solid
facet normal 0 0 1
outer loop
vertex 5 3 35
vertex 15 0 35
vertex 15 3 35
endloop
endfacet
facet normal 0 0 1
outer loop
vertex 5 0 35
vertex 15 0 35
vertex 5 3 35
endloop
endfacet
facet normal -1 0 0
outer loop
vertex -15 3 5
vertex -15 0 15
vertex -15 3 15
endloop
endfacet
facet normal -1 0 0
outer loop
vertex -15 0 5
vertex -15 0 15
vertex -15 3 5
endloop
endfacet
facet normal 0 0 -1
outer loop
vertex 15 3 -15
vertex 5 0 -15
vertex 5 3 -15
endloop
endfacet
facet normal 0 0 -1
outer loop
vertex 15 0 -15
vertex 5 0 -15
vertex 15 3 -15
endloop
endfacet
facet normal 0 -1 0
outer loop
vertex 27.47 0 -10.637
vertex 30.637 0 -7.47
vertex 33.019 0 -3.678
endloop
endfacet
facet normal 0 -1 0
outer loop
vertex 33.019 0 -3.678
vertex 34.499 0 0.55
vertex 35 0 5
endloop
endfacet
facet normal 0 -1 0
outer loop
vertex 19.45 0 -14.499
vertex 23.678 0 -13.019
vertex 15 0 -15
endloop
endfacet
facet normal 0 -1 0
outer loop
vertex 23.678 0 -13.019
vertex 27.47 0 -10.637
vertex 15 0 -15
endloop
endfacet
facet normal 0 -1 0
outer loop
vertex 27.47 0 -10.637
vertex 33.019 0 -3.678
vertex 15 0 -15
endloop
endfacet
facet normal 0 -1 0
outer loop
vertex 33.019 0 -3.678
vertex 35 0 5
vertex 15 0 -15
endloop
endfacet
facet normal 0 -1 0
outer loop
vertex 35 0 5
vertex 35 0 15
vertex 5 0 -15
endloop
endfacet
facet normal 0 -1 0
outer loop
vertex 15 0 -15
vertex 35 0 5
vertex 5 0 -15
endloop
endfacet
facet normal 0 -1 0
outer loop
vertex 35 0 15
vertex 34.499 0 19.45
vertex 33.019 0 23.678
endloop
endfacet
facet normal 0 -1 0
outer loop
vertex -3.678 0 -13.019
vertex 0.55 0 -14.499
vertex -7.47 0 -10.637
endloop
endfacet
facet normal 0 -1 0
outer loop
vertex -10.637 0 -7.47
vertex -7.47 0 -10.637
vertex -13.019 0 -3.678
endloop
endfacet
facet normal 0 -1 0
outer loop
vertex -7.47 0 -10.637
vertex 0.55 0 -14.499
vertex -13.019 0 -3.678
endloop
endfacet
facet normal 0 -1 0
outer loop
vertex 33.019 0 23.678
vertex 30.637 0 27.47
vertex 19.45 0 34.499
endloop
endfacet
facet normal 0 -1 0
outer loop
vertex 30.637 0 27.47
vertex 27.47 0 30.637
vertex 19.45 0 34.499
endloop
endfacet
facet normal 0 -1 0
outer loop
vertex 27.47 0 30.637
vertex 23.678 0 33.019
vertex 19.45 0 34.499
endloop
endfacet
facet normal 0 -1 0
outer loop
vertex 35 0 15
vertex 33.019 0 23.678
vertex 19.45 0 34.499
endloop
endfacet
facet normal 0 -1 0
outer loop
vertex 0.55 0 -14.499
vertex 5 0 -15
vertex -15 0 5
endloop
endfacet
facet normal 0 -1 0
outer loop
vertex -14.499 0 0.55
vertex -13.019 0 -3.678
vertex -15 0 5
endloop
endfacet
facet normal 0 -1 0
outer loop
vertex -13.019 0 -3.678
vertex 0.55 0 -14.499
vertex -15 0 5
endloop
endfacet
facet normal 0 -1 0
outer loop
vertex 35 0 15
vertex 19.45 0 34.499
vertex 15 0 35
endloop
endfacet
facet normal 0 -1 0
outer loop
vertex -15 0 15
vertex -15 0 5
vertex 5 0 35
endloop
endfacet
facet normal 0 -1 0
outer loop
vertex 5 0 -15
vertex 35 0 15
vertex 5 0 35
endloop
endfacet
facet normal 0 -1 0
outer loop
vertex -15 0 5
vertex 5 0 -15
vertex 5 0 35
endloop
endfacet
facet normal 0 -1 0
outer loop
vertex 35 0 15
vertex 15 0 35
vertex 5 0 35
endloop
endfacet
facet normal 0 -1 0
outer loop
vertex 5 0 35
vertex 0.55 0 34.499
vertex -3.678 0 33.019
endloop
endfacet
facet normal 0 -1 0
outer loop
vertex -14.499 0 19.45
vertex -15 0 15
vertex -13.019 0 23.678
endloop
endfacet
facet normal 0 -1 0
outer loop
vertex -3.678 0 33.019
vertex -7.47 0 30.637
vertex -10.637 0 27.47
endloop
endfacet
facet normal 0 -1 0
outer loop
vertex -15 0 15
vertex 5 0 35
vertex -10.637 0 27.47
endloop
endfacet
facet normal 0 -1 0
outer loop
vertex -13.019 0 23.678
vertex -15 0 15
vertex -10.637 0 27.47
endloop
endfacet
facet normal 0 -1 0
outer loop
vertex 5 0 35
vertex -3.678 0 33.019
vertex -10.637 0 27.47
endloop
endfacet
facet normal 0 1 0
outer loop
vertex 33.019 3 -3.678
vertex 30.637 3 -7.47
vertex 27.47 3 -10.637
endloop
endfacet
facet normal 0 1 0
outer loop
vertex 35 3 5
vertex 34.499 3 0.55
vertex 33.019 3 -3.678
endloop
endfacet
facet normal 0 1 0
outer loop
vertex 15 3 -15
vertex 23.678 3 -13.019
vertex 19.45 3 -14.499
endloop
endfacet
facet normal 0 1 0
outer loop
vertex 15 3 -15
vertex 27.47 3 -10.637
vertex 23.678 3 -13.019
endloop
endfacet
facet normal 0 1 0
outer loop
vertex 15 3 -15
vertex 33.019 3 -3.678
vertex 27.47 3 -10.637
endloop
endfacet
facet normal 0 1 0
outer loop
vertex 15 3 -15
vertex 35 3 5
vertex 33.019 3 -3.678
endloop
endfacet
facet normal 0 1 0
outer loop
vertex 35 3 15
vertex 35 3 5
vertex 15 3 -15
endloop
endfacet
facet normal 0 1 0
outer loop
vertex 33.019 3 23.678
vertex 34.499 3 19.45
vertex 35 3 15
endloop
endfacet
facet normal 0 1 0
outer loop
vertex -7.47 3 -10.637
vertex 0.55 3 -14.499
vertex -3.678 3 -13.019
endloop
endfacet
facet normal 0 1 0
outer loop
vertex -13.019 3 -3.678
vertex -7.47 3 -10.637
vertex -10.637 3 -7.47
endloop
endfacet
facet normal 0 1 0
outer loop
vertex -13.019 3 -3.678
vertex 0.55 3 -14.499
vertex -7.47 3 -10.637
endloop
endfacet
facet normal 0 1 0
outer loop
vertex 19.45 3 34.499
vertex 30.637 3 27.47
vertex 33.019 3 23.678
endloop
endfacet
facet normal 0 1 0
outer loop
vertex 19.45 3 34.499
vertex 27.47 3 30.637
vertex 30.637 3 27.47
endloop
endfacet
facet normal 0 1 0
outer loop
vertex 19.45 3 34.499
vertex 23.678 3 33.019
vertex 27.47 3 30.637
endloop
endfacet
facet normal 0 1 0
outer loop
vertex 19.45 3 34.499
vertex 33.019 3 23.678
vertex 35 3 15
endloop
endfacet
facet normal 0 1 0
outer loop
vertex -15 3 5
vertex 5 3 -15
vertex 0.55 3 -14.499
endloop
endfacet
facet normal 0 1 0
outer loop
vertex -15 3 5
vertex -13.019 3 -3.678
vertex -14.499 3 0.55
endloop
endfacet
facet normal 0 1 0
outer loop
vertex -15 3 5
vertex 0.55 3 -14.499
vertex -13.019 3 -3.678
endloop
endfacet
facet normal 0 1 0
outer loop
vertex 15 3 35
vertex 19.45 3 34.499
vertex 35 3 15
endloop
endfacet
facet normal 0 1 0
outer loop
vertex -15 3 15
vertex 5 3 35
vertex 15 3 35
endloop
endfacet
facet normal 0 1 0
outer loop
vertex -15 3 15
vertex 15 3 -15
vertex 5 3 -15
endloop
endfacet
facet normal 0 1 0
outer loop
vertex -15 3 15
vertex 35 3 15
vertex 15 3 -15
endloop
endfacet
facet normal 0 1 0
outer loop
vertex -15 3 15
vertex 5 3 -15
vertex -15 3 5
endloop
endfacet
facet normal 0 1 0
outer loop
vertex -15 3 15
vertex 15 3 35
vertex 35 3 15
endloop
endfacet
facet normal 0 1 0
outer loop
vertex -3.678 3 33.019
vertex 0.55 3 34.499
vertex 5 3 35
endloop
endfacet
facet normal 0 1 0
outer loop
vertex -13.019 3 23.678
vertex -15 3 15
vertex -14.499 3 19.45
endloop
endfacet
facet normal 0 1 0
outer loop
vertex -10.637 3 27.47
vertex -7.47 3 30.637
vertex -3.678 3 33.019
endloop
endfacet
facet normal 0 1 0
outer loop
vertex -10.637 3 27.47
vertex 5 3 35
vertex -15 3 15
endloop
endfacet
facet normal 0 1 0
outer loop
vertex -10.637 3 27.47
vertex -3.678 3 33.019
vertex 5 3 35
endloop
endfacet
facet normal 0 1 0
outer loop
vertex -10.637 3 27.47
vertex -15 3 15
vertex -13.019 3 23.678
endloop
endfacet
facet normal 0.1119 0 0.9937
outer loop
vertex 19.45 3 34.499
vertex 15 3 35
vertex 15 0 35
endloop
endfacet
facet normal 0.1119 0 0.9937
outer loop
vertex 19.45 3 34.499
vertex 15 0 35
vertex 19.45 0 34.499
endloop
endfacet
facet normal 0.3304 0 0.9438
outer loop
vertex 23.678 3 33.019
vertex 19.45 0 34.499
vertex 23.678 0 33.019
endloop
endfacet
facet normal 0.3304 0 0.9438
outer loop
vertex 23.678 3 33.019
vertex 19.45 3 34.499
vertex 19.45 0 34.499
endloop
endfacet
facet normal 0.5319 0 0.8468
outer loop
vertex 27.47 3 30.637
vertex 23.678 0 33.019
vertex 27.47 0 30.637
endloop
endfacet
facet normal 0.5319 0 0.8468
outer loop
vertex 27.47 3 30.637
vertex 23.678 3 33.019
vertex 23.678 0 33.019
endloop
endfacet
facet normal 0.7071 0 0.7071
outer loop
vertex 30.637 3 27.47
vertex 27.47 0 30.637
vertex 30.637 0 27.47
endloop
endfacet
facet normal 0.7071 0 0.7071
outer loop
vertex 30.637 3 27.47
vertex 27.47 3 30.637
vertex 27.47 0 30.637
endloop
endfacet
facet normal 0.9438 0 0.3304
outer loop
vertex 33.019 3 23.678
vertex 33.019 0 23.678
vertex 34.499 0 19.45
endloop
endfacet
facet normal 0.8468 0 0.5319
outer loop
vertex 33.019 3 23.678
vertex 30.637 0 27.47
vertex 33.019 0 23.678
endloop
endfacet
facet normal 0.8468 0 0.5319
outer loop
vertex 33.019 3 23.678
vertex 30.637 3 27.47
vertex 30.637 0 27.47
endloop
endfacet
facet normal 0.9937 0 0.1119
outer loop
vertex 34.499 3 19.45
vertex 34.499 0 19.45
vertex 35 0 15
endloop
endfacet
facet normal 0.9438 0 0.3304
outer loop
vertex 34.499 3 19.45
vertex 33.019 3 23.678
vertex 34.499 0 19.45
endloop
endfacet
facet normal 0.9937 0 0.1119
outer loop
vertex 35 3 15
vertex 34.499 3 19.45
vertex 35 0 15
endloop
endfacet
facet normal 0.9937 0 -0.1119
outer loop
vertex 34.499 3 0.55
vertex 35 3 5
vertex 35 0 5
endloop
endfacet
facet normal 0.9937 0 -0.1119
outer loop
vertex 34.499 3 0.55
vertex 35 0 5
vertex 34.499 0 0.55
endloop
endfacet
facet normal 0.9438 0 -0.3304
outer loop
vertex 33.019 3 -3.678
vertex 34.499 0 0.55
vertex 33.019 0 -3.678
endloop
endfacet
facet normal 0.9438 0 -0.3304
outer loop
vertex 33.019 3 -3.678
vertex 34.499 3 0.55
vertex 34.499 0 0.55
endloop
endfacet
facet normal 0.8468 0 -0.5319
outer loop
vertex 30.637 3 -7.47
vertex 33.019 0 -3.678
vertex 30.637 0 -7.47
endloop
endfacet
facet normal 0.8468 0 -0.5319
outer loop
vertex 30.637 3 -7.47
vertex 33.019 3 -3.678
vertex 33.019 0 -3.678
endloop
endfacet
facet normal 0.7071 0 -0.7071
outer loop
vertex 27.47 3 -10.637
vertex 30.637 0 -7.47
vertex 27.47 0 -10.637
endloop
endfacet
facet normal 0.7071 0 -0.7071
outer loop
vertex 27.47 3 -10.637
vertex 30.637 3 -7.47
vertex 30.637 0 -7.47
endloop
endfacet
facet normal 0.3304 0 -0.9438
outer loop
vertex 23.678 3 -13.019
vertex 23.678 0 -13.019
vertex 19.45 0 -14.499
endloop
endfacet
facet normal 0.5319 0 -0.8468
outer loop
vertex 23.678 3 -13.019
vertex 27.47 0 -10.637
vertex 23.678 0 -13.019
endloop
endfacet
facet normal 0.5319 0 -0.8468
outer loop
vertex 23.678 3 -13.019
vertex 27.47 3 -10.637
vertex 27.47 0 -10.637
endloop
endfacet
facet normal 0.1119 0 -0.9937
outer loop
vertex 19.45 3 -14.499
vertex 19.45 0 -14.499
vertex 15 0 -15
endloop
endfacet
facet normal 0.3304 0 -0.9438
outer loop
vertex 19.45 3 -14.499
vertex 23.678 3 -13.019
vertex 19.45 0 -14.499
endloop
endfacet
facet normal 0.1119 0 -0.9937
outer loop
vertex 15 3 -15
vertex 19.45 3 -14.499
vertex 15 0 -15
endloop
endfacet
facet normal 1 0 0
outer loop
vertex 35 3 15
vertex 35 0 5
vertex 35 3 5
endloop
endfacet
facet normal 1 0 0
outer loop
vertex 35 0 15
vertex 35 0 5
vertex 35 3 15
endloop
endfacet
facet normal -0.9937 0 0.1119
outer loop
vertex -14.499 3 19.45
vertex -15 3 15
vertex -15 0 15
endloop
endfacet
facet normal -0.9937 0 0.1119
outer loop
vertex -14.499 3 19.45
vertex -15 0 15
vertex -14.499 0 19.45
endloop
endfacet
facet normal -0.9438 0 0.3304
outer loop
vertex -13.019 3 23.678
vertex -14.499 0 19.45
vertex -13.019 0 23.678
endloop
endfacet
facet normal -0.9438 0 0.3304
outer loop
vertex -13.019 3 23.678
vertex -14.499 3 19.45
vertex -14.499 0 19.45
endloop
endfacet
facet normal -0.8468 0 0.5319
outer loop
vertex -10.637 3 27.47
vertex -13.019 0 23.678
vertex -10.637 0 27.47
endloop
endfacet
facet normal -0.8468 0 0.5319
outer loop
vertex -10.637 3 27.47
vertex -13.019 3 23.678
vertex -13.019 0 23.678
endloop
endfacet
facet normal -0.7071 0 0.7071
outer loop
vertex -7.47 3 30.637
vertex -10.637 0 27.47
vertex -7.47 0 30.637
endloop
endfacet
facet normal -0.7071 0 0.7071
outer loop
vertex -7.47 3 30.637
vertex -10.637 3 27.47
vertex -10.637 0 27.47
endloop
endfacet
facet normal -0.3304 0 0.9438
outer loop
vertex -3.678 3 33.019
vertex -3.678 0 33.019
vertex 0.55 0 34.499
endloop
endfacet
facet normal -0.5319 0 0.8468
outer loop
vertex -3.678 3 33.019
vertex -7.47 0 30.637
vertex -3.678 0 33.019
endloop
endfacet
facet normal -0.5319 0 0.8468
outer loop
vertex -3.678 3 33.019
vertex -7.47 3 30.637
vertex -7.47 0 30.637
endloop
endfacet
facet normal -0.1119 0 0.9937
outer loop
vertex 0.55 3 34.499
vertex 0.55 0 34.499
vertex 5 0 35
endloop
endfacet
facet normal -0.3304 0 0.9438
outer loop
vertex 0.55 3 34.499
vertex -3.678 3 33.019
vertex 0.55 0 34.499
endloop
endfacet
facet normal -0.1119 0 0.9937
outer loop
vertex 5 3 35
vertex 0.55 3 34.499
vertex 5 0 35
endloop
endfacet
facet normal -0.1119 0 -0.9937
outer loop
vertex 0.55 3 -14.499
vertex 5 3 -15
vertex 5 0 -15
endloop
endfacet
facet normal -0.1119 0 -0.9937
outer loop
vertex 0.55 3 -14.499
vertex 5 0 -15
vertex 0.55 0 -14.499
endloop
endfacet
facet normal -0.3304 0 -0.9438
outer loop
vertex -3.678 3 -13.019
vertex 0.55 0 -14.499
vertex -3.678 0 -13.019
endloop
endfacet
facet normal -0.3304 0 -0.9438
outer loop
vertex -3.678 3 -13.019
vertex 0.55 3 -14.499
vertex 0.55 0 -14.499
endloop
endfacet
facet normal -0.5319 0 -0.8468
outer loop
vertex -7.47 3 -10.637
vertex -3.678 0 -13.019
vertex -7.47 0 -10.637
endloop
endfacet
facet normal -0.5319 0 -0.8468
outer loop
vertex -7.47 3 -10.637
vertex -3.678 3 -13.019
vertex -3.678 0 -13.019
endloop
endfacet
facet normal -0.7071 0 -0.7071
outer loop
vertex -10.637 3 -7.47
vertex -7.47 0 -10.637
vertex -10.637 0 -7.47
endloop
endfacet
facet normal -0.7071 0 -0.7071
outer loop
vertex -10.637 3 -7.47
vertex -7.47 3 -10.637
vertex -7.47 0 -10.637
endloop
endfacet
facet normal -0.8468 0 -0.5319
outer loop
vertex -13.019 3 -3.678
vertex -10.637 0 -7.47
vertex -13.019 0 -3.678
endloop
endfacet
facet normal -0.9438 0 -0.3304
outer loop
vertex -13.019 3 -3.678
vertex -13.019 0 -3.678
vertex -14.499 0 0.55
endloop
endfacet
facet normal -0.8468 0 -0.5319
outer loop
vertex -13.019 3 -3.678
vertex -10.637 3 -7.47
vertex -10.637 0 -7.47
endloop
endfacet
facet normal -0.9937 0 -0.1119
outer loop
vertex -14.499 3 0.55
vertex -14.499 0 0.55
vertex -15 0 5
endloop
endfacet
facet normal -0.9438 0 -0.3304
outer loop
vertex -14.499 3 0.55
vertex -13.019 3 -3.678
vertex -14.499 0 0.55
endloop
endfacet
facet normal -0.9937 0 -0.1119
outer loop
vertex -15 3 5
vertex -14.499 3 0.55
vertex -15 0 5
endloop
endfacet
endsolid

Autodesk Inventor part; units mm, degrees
ref_plane "YZ Plane" through (0, 0, 0) normal (1, 0, 0) x (0, 1, 0)
ref_plane "XZ Plane" through (0, 0, 0) normal (0, 1, 0) x (-1, 0, 0)
ref_plane "XY Plane" through (0, 0, 0) normal (0, 0, 1) x (1, 0, 0)
sketch "Sketch1" plane through (0, 0, 0) normal (0, 1, 0) x (-1, 0, 0)
  line L0 (15, -15) -> (-35, -15)
  line L1 (-35, -15) -> (-35, 35)
  line L2 (-35, 35) -> (15, 35)
  line L3 (15, 35) -> (15, -15)
  line L4 (15, -15) -> (-35, 35) construction
  line L5 (-35, -15) -> (15, 35) construction
  point P0 (-10, 10)
  dimension "d2" = 50
  dimension "d3" = 50
extrude "Extrusion1" add sketch "Sketch1" along normal blind 3
fillet "Fillet1" radius 20 4 edges at (35, 1.5, 35) (-15, 1.5, 35) (-15, 1.5, -15) (35, 1.5, -15)
equation "\"d2\" = d3"
properties part number "power-bank-bump"
